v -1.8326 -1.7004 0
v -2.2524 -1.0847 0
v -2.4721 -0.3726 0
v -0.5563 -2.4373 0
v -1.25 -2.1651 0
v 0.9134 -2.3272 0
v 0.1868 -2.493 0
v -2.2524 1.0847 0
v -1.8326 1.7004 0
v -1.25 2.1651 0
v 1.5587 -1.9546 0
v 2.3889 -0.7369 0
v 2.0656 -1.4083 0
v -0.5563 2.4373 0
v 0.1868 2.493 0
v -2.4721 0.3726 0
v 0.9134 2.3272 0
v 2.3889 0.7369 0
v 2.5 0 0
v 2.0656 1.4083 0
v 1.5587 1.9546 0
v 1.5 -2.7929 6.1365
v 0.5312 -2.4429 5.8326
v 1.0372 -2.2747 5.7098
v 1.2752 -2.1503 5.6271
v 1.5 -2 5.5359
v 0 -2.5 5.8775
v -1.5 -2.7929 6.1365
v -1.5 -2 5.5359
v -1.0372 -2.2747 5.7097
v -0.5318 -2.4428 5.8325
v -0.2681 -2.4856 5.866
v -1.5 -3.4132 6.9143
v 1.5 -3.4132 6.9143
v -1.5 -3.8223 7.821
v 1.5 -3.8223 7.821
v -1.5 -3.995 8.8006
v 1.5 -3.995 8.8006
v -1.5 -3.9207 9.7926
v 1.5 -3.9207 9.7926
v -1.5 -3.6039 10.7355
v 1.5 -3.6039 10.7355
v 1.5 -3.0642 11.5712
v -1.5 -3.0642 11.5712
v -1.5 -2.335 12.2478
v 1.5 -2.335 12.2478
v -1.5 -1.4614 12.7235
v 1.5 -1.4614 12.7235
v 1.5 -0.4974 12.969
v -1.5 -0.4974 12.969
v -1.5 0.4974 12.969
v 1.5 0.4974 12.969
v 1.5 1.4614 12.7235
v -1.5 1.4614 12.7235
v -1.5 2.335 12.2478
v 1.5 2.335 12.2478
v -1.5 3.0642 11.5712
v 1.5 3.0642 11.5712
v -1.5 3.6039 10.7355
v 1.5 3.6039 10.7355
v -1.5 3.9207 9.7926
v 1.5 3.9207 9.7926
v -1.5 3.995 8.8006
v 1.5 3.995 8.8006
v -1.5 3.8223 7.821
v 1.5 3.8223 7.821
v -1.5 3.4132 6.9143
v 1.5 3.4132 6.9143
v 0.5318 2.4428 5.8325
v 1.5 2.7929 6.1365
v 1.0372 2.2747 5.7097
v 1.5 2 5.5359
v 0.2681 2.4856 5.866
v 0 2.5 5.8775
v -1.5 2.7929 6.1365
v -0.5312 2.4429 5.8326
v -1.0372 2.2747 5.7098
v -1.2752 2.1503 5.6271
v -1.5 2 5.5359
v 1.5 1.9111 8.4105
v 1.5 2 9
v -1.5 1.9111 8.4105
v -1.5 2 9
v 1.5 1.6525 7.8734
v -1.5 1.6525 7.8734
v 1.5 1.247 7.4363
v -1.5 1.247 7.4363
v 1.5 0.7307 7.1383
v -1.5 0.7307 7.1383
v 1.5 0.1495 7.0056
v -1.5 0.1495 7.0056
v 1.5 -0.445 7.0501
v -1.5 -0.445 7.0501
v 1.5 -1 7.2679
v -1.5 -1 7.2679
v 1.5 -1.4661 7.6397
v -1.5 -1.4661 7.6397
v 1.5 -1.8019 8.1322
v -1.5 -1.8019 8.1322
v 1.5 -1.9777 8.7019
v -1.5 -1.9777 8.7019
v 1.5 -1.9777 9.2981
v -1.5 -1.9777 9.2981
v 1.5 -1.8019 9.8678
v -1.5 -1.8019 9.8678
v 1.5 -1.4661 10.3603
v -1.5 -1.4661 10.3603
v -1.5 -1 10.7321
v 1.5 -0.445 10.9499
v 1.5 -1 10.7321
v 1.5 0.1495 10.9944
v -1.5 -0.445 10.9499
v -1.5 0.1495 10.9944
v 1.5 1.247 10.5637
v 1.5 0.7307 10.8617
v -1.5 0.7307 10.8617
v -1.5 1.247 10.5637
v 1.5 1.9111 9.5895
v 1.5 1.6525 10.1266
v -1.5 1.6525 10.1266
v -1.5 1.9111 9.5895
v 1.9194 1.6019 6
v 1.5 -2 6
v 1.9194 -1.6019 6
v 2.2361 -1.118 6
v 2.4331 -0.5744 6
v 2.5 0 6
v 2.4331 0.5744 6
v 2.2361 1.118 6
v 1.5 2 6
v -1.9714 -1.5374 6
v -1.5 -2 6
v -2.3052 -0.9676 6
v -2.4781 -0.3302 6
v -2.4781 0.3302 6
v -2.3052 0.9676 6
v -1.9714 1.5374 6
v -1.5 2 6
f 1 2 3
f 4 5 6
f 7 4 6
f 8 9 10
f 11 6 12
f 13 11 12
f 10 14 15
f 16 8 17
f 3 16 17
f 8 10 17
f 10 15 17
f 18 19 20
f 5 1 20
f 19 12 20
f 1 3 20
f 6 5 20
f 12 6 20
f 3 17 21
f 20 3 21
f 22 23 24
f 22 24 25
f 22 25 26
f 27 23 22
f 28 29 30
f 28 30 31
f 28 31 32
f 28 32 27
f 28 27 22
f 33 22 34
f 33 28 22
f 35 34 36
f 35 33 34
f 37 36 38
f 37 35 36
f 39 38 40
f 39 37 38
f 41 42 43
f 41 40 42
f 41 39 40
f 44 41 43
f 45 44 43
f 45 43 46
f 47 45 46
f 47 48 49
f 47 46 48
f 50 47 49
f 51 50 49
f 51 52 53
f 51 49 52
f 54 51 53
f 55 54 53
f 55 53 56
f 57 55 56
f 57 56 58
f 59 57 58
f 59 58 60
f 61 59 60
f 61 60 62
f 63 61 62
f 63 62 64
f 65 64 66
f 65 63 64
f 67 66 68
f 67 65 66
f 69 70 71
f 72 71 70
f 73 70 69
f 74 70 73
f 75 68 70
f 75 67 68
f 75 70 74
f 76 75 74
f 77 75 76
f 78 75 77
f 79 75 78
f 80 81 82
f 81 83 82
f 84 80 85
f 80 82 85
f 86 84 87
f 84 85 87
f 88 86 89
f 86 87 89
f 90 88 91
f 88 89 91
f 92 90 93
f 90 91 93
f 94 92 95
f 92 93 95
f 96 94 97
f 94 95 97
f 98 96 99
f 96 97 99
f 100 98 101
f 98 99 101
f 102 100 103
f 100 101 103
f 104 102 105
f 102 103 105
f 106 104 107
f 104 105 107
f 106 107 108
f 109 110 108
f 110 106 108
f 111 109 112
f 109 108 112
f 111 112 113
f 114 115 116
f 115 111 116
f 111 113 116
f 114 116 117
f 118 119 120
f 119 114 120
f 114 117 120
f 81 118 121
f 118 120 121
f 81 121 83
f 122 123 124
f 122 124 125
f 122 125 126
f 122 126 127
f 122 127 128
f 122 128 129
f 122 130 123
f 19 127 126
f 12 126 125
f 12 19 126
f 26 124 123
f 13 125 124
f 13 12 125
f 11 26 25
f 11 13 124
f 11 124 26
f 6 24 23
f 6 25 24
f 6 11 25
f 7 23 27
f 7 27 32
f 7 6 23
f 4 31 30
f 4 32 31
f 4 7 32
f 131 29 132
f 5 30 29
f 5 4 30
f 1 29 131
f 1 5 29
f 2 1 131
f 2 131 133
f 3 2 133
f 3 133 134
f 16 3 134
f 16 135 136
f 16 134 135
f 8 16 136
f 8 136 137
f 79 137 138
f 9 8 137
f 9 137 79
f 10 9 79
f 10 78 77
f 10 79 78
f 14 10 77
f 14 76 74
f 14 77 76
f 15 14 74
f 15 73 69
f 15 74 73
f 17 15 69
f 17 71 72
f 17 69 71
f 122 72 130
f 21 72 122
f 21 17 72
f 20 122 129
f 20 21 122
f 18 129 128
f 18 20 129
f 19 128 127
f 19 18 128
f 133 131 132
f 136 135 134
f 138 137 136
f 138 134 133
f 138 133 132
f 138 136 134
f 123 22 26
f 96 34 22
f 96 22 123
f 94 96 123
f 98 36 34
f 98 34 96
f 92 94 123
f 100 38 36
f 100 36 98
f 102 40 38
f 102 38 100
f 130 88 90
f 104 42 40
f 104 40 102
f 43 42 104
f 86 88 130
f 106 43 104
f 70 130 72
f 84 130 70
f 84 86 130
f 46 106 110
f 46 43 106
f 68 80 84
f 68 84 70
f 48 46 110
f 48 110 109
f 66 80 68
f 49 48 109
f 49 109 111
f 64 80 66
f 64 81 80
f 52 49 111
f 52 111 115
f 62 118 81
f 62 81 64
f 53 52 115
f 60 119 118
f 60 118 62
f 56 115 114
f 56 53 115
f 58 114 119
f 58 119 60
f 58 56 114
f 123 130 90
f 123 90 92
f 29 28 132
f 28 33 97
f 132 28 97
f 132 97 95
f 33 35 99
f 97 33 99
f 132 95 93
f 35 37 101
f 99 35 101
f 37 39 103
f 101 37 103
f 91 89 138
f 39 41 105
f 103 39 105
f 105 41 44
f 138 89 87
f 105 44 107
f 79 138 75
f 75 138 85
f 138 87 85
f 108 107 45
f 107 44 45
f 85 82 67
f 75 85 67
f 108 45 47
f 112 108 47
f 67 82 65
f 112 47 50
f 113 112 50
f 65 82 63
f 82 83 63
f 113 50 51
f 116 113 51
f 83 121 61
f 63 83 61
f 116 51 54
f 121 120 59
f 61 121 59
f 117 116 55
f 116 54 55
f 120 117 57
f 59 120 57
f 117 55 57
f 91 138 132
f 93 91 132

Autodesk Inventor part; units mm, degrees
ref_plane "YZ Plane" through (0, 0, 0) normal (1, 0, 0) x (0, 1, 0)
ref_plane "XZ Plane" through (0, 0, 0) normal (0, 1, 0) x (-1, 0, 0)
ref_plane "XY Plane" through (0, 0, 0) normal (0, 0, 1) x (1, 0, 0)
sketch "スケッチ1" plane through (0, 0, 0) normal (0, 0, 1) x (1, 0, 0)
  circle A0 centre (0, 0) radius 2.5
  dimension "d0" = 5
extrude "押し出し1" add sketch "スケッチ1" along normal blind 5
sketch "スケッチ2" plane through (0, 0, 0) normal (1, 0, 0) x (0, 1, 0)
  line L0 (2.5, 5) -> (-2.5, 5) projected
  line L1 (2.5, 0) -> (-2.5, 0) projected
  circle A0 centre (0, 9) radius 2
  circle A1 centre (0, 9) radius 4
  line L2 (2.5, 5) -> (-2.5, 5) projected
  point P0 (0, 0)
  dimension "d3" = 4
  dimension "d4" = 8
sketch "スケッチ3" plane through (0, 0, 5) normal (0, 0, 1) x (1, 0, 0)
  circle A0 centre (0, 0) radius 2.5 projected
extrude "押し出し2" add sketch "スケッチ3" along normal blind 1
extrude "押し出し3" add sketch "スケッチ2" along normal mid plane 3
properties part number "尻" material "ABS プラスチック"
